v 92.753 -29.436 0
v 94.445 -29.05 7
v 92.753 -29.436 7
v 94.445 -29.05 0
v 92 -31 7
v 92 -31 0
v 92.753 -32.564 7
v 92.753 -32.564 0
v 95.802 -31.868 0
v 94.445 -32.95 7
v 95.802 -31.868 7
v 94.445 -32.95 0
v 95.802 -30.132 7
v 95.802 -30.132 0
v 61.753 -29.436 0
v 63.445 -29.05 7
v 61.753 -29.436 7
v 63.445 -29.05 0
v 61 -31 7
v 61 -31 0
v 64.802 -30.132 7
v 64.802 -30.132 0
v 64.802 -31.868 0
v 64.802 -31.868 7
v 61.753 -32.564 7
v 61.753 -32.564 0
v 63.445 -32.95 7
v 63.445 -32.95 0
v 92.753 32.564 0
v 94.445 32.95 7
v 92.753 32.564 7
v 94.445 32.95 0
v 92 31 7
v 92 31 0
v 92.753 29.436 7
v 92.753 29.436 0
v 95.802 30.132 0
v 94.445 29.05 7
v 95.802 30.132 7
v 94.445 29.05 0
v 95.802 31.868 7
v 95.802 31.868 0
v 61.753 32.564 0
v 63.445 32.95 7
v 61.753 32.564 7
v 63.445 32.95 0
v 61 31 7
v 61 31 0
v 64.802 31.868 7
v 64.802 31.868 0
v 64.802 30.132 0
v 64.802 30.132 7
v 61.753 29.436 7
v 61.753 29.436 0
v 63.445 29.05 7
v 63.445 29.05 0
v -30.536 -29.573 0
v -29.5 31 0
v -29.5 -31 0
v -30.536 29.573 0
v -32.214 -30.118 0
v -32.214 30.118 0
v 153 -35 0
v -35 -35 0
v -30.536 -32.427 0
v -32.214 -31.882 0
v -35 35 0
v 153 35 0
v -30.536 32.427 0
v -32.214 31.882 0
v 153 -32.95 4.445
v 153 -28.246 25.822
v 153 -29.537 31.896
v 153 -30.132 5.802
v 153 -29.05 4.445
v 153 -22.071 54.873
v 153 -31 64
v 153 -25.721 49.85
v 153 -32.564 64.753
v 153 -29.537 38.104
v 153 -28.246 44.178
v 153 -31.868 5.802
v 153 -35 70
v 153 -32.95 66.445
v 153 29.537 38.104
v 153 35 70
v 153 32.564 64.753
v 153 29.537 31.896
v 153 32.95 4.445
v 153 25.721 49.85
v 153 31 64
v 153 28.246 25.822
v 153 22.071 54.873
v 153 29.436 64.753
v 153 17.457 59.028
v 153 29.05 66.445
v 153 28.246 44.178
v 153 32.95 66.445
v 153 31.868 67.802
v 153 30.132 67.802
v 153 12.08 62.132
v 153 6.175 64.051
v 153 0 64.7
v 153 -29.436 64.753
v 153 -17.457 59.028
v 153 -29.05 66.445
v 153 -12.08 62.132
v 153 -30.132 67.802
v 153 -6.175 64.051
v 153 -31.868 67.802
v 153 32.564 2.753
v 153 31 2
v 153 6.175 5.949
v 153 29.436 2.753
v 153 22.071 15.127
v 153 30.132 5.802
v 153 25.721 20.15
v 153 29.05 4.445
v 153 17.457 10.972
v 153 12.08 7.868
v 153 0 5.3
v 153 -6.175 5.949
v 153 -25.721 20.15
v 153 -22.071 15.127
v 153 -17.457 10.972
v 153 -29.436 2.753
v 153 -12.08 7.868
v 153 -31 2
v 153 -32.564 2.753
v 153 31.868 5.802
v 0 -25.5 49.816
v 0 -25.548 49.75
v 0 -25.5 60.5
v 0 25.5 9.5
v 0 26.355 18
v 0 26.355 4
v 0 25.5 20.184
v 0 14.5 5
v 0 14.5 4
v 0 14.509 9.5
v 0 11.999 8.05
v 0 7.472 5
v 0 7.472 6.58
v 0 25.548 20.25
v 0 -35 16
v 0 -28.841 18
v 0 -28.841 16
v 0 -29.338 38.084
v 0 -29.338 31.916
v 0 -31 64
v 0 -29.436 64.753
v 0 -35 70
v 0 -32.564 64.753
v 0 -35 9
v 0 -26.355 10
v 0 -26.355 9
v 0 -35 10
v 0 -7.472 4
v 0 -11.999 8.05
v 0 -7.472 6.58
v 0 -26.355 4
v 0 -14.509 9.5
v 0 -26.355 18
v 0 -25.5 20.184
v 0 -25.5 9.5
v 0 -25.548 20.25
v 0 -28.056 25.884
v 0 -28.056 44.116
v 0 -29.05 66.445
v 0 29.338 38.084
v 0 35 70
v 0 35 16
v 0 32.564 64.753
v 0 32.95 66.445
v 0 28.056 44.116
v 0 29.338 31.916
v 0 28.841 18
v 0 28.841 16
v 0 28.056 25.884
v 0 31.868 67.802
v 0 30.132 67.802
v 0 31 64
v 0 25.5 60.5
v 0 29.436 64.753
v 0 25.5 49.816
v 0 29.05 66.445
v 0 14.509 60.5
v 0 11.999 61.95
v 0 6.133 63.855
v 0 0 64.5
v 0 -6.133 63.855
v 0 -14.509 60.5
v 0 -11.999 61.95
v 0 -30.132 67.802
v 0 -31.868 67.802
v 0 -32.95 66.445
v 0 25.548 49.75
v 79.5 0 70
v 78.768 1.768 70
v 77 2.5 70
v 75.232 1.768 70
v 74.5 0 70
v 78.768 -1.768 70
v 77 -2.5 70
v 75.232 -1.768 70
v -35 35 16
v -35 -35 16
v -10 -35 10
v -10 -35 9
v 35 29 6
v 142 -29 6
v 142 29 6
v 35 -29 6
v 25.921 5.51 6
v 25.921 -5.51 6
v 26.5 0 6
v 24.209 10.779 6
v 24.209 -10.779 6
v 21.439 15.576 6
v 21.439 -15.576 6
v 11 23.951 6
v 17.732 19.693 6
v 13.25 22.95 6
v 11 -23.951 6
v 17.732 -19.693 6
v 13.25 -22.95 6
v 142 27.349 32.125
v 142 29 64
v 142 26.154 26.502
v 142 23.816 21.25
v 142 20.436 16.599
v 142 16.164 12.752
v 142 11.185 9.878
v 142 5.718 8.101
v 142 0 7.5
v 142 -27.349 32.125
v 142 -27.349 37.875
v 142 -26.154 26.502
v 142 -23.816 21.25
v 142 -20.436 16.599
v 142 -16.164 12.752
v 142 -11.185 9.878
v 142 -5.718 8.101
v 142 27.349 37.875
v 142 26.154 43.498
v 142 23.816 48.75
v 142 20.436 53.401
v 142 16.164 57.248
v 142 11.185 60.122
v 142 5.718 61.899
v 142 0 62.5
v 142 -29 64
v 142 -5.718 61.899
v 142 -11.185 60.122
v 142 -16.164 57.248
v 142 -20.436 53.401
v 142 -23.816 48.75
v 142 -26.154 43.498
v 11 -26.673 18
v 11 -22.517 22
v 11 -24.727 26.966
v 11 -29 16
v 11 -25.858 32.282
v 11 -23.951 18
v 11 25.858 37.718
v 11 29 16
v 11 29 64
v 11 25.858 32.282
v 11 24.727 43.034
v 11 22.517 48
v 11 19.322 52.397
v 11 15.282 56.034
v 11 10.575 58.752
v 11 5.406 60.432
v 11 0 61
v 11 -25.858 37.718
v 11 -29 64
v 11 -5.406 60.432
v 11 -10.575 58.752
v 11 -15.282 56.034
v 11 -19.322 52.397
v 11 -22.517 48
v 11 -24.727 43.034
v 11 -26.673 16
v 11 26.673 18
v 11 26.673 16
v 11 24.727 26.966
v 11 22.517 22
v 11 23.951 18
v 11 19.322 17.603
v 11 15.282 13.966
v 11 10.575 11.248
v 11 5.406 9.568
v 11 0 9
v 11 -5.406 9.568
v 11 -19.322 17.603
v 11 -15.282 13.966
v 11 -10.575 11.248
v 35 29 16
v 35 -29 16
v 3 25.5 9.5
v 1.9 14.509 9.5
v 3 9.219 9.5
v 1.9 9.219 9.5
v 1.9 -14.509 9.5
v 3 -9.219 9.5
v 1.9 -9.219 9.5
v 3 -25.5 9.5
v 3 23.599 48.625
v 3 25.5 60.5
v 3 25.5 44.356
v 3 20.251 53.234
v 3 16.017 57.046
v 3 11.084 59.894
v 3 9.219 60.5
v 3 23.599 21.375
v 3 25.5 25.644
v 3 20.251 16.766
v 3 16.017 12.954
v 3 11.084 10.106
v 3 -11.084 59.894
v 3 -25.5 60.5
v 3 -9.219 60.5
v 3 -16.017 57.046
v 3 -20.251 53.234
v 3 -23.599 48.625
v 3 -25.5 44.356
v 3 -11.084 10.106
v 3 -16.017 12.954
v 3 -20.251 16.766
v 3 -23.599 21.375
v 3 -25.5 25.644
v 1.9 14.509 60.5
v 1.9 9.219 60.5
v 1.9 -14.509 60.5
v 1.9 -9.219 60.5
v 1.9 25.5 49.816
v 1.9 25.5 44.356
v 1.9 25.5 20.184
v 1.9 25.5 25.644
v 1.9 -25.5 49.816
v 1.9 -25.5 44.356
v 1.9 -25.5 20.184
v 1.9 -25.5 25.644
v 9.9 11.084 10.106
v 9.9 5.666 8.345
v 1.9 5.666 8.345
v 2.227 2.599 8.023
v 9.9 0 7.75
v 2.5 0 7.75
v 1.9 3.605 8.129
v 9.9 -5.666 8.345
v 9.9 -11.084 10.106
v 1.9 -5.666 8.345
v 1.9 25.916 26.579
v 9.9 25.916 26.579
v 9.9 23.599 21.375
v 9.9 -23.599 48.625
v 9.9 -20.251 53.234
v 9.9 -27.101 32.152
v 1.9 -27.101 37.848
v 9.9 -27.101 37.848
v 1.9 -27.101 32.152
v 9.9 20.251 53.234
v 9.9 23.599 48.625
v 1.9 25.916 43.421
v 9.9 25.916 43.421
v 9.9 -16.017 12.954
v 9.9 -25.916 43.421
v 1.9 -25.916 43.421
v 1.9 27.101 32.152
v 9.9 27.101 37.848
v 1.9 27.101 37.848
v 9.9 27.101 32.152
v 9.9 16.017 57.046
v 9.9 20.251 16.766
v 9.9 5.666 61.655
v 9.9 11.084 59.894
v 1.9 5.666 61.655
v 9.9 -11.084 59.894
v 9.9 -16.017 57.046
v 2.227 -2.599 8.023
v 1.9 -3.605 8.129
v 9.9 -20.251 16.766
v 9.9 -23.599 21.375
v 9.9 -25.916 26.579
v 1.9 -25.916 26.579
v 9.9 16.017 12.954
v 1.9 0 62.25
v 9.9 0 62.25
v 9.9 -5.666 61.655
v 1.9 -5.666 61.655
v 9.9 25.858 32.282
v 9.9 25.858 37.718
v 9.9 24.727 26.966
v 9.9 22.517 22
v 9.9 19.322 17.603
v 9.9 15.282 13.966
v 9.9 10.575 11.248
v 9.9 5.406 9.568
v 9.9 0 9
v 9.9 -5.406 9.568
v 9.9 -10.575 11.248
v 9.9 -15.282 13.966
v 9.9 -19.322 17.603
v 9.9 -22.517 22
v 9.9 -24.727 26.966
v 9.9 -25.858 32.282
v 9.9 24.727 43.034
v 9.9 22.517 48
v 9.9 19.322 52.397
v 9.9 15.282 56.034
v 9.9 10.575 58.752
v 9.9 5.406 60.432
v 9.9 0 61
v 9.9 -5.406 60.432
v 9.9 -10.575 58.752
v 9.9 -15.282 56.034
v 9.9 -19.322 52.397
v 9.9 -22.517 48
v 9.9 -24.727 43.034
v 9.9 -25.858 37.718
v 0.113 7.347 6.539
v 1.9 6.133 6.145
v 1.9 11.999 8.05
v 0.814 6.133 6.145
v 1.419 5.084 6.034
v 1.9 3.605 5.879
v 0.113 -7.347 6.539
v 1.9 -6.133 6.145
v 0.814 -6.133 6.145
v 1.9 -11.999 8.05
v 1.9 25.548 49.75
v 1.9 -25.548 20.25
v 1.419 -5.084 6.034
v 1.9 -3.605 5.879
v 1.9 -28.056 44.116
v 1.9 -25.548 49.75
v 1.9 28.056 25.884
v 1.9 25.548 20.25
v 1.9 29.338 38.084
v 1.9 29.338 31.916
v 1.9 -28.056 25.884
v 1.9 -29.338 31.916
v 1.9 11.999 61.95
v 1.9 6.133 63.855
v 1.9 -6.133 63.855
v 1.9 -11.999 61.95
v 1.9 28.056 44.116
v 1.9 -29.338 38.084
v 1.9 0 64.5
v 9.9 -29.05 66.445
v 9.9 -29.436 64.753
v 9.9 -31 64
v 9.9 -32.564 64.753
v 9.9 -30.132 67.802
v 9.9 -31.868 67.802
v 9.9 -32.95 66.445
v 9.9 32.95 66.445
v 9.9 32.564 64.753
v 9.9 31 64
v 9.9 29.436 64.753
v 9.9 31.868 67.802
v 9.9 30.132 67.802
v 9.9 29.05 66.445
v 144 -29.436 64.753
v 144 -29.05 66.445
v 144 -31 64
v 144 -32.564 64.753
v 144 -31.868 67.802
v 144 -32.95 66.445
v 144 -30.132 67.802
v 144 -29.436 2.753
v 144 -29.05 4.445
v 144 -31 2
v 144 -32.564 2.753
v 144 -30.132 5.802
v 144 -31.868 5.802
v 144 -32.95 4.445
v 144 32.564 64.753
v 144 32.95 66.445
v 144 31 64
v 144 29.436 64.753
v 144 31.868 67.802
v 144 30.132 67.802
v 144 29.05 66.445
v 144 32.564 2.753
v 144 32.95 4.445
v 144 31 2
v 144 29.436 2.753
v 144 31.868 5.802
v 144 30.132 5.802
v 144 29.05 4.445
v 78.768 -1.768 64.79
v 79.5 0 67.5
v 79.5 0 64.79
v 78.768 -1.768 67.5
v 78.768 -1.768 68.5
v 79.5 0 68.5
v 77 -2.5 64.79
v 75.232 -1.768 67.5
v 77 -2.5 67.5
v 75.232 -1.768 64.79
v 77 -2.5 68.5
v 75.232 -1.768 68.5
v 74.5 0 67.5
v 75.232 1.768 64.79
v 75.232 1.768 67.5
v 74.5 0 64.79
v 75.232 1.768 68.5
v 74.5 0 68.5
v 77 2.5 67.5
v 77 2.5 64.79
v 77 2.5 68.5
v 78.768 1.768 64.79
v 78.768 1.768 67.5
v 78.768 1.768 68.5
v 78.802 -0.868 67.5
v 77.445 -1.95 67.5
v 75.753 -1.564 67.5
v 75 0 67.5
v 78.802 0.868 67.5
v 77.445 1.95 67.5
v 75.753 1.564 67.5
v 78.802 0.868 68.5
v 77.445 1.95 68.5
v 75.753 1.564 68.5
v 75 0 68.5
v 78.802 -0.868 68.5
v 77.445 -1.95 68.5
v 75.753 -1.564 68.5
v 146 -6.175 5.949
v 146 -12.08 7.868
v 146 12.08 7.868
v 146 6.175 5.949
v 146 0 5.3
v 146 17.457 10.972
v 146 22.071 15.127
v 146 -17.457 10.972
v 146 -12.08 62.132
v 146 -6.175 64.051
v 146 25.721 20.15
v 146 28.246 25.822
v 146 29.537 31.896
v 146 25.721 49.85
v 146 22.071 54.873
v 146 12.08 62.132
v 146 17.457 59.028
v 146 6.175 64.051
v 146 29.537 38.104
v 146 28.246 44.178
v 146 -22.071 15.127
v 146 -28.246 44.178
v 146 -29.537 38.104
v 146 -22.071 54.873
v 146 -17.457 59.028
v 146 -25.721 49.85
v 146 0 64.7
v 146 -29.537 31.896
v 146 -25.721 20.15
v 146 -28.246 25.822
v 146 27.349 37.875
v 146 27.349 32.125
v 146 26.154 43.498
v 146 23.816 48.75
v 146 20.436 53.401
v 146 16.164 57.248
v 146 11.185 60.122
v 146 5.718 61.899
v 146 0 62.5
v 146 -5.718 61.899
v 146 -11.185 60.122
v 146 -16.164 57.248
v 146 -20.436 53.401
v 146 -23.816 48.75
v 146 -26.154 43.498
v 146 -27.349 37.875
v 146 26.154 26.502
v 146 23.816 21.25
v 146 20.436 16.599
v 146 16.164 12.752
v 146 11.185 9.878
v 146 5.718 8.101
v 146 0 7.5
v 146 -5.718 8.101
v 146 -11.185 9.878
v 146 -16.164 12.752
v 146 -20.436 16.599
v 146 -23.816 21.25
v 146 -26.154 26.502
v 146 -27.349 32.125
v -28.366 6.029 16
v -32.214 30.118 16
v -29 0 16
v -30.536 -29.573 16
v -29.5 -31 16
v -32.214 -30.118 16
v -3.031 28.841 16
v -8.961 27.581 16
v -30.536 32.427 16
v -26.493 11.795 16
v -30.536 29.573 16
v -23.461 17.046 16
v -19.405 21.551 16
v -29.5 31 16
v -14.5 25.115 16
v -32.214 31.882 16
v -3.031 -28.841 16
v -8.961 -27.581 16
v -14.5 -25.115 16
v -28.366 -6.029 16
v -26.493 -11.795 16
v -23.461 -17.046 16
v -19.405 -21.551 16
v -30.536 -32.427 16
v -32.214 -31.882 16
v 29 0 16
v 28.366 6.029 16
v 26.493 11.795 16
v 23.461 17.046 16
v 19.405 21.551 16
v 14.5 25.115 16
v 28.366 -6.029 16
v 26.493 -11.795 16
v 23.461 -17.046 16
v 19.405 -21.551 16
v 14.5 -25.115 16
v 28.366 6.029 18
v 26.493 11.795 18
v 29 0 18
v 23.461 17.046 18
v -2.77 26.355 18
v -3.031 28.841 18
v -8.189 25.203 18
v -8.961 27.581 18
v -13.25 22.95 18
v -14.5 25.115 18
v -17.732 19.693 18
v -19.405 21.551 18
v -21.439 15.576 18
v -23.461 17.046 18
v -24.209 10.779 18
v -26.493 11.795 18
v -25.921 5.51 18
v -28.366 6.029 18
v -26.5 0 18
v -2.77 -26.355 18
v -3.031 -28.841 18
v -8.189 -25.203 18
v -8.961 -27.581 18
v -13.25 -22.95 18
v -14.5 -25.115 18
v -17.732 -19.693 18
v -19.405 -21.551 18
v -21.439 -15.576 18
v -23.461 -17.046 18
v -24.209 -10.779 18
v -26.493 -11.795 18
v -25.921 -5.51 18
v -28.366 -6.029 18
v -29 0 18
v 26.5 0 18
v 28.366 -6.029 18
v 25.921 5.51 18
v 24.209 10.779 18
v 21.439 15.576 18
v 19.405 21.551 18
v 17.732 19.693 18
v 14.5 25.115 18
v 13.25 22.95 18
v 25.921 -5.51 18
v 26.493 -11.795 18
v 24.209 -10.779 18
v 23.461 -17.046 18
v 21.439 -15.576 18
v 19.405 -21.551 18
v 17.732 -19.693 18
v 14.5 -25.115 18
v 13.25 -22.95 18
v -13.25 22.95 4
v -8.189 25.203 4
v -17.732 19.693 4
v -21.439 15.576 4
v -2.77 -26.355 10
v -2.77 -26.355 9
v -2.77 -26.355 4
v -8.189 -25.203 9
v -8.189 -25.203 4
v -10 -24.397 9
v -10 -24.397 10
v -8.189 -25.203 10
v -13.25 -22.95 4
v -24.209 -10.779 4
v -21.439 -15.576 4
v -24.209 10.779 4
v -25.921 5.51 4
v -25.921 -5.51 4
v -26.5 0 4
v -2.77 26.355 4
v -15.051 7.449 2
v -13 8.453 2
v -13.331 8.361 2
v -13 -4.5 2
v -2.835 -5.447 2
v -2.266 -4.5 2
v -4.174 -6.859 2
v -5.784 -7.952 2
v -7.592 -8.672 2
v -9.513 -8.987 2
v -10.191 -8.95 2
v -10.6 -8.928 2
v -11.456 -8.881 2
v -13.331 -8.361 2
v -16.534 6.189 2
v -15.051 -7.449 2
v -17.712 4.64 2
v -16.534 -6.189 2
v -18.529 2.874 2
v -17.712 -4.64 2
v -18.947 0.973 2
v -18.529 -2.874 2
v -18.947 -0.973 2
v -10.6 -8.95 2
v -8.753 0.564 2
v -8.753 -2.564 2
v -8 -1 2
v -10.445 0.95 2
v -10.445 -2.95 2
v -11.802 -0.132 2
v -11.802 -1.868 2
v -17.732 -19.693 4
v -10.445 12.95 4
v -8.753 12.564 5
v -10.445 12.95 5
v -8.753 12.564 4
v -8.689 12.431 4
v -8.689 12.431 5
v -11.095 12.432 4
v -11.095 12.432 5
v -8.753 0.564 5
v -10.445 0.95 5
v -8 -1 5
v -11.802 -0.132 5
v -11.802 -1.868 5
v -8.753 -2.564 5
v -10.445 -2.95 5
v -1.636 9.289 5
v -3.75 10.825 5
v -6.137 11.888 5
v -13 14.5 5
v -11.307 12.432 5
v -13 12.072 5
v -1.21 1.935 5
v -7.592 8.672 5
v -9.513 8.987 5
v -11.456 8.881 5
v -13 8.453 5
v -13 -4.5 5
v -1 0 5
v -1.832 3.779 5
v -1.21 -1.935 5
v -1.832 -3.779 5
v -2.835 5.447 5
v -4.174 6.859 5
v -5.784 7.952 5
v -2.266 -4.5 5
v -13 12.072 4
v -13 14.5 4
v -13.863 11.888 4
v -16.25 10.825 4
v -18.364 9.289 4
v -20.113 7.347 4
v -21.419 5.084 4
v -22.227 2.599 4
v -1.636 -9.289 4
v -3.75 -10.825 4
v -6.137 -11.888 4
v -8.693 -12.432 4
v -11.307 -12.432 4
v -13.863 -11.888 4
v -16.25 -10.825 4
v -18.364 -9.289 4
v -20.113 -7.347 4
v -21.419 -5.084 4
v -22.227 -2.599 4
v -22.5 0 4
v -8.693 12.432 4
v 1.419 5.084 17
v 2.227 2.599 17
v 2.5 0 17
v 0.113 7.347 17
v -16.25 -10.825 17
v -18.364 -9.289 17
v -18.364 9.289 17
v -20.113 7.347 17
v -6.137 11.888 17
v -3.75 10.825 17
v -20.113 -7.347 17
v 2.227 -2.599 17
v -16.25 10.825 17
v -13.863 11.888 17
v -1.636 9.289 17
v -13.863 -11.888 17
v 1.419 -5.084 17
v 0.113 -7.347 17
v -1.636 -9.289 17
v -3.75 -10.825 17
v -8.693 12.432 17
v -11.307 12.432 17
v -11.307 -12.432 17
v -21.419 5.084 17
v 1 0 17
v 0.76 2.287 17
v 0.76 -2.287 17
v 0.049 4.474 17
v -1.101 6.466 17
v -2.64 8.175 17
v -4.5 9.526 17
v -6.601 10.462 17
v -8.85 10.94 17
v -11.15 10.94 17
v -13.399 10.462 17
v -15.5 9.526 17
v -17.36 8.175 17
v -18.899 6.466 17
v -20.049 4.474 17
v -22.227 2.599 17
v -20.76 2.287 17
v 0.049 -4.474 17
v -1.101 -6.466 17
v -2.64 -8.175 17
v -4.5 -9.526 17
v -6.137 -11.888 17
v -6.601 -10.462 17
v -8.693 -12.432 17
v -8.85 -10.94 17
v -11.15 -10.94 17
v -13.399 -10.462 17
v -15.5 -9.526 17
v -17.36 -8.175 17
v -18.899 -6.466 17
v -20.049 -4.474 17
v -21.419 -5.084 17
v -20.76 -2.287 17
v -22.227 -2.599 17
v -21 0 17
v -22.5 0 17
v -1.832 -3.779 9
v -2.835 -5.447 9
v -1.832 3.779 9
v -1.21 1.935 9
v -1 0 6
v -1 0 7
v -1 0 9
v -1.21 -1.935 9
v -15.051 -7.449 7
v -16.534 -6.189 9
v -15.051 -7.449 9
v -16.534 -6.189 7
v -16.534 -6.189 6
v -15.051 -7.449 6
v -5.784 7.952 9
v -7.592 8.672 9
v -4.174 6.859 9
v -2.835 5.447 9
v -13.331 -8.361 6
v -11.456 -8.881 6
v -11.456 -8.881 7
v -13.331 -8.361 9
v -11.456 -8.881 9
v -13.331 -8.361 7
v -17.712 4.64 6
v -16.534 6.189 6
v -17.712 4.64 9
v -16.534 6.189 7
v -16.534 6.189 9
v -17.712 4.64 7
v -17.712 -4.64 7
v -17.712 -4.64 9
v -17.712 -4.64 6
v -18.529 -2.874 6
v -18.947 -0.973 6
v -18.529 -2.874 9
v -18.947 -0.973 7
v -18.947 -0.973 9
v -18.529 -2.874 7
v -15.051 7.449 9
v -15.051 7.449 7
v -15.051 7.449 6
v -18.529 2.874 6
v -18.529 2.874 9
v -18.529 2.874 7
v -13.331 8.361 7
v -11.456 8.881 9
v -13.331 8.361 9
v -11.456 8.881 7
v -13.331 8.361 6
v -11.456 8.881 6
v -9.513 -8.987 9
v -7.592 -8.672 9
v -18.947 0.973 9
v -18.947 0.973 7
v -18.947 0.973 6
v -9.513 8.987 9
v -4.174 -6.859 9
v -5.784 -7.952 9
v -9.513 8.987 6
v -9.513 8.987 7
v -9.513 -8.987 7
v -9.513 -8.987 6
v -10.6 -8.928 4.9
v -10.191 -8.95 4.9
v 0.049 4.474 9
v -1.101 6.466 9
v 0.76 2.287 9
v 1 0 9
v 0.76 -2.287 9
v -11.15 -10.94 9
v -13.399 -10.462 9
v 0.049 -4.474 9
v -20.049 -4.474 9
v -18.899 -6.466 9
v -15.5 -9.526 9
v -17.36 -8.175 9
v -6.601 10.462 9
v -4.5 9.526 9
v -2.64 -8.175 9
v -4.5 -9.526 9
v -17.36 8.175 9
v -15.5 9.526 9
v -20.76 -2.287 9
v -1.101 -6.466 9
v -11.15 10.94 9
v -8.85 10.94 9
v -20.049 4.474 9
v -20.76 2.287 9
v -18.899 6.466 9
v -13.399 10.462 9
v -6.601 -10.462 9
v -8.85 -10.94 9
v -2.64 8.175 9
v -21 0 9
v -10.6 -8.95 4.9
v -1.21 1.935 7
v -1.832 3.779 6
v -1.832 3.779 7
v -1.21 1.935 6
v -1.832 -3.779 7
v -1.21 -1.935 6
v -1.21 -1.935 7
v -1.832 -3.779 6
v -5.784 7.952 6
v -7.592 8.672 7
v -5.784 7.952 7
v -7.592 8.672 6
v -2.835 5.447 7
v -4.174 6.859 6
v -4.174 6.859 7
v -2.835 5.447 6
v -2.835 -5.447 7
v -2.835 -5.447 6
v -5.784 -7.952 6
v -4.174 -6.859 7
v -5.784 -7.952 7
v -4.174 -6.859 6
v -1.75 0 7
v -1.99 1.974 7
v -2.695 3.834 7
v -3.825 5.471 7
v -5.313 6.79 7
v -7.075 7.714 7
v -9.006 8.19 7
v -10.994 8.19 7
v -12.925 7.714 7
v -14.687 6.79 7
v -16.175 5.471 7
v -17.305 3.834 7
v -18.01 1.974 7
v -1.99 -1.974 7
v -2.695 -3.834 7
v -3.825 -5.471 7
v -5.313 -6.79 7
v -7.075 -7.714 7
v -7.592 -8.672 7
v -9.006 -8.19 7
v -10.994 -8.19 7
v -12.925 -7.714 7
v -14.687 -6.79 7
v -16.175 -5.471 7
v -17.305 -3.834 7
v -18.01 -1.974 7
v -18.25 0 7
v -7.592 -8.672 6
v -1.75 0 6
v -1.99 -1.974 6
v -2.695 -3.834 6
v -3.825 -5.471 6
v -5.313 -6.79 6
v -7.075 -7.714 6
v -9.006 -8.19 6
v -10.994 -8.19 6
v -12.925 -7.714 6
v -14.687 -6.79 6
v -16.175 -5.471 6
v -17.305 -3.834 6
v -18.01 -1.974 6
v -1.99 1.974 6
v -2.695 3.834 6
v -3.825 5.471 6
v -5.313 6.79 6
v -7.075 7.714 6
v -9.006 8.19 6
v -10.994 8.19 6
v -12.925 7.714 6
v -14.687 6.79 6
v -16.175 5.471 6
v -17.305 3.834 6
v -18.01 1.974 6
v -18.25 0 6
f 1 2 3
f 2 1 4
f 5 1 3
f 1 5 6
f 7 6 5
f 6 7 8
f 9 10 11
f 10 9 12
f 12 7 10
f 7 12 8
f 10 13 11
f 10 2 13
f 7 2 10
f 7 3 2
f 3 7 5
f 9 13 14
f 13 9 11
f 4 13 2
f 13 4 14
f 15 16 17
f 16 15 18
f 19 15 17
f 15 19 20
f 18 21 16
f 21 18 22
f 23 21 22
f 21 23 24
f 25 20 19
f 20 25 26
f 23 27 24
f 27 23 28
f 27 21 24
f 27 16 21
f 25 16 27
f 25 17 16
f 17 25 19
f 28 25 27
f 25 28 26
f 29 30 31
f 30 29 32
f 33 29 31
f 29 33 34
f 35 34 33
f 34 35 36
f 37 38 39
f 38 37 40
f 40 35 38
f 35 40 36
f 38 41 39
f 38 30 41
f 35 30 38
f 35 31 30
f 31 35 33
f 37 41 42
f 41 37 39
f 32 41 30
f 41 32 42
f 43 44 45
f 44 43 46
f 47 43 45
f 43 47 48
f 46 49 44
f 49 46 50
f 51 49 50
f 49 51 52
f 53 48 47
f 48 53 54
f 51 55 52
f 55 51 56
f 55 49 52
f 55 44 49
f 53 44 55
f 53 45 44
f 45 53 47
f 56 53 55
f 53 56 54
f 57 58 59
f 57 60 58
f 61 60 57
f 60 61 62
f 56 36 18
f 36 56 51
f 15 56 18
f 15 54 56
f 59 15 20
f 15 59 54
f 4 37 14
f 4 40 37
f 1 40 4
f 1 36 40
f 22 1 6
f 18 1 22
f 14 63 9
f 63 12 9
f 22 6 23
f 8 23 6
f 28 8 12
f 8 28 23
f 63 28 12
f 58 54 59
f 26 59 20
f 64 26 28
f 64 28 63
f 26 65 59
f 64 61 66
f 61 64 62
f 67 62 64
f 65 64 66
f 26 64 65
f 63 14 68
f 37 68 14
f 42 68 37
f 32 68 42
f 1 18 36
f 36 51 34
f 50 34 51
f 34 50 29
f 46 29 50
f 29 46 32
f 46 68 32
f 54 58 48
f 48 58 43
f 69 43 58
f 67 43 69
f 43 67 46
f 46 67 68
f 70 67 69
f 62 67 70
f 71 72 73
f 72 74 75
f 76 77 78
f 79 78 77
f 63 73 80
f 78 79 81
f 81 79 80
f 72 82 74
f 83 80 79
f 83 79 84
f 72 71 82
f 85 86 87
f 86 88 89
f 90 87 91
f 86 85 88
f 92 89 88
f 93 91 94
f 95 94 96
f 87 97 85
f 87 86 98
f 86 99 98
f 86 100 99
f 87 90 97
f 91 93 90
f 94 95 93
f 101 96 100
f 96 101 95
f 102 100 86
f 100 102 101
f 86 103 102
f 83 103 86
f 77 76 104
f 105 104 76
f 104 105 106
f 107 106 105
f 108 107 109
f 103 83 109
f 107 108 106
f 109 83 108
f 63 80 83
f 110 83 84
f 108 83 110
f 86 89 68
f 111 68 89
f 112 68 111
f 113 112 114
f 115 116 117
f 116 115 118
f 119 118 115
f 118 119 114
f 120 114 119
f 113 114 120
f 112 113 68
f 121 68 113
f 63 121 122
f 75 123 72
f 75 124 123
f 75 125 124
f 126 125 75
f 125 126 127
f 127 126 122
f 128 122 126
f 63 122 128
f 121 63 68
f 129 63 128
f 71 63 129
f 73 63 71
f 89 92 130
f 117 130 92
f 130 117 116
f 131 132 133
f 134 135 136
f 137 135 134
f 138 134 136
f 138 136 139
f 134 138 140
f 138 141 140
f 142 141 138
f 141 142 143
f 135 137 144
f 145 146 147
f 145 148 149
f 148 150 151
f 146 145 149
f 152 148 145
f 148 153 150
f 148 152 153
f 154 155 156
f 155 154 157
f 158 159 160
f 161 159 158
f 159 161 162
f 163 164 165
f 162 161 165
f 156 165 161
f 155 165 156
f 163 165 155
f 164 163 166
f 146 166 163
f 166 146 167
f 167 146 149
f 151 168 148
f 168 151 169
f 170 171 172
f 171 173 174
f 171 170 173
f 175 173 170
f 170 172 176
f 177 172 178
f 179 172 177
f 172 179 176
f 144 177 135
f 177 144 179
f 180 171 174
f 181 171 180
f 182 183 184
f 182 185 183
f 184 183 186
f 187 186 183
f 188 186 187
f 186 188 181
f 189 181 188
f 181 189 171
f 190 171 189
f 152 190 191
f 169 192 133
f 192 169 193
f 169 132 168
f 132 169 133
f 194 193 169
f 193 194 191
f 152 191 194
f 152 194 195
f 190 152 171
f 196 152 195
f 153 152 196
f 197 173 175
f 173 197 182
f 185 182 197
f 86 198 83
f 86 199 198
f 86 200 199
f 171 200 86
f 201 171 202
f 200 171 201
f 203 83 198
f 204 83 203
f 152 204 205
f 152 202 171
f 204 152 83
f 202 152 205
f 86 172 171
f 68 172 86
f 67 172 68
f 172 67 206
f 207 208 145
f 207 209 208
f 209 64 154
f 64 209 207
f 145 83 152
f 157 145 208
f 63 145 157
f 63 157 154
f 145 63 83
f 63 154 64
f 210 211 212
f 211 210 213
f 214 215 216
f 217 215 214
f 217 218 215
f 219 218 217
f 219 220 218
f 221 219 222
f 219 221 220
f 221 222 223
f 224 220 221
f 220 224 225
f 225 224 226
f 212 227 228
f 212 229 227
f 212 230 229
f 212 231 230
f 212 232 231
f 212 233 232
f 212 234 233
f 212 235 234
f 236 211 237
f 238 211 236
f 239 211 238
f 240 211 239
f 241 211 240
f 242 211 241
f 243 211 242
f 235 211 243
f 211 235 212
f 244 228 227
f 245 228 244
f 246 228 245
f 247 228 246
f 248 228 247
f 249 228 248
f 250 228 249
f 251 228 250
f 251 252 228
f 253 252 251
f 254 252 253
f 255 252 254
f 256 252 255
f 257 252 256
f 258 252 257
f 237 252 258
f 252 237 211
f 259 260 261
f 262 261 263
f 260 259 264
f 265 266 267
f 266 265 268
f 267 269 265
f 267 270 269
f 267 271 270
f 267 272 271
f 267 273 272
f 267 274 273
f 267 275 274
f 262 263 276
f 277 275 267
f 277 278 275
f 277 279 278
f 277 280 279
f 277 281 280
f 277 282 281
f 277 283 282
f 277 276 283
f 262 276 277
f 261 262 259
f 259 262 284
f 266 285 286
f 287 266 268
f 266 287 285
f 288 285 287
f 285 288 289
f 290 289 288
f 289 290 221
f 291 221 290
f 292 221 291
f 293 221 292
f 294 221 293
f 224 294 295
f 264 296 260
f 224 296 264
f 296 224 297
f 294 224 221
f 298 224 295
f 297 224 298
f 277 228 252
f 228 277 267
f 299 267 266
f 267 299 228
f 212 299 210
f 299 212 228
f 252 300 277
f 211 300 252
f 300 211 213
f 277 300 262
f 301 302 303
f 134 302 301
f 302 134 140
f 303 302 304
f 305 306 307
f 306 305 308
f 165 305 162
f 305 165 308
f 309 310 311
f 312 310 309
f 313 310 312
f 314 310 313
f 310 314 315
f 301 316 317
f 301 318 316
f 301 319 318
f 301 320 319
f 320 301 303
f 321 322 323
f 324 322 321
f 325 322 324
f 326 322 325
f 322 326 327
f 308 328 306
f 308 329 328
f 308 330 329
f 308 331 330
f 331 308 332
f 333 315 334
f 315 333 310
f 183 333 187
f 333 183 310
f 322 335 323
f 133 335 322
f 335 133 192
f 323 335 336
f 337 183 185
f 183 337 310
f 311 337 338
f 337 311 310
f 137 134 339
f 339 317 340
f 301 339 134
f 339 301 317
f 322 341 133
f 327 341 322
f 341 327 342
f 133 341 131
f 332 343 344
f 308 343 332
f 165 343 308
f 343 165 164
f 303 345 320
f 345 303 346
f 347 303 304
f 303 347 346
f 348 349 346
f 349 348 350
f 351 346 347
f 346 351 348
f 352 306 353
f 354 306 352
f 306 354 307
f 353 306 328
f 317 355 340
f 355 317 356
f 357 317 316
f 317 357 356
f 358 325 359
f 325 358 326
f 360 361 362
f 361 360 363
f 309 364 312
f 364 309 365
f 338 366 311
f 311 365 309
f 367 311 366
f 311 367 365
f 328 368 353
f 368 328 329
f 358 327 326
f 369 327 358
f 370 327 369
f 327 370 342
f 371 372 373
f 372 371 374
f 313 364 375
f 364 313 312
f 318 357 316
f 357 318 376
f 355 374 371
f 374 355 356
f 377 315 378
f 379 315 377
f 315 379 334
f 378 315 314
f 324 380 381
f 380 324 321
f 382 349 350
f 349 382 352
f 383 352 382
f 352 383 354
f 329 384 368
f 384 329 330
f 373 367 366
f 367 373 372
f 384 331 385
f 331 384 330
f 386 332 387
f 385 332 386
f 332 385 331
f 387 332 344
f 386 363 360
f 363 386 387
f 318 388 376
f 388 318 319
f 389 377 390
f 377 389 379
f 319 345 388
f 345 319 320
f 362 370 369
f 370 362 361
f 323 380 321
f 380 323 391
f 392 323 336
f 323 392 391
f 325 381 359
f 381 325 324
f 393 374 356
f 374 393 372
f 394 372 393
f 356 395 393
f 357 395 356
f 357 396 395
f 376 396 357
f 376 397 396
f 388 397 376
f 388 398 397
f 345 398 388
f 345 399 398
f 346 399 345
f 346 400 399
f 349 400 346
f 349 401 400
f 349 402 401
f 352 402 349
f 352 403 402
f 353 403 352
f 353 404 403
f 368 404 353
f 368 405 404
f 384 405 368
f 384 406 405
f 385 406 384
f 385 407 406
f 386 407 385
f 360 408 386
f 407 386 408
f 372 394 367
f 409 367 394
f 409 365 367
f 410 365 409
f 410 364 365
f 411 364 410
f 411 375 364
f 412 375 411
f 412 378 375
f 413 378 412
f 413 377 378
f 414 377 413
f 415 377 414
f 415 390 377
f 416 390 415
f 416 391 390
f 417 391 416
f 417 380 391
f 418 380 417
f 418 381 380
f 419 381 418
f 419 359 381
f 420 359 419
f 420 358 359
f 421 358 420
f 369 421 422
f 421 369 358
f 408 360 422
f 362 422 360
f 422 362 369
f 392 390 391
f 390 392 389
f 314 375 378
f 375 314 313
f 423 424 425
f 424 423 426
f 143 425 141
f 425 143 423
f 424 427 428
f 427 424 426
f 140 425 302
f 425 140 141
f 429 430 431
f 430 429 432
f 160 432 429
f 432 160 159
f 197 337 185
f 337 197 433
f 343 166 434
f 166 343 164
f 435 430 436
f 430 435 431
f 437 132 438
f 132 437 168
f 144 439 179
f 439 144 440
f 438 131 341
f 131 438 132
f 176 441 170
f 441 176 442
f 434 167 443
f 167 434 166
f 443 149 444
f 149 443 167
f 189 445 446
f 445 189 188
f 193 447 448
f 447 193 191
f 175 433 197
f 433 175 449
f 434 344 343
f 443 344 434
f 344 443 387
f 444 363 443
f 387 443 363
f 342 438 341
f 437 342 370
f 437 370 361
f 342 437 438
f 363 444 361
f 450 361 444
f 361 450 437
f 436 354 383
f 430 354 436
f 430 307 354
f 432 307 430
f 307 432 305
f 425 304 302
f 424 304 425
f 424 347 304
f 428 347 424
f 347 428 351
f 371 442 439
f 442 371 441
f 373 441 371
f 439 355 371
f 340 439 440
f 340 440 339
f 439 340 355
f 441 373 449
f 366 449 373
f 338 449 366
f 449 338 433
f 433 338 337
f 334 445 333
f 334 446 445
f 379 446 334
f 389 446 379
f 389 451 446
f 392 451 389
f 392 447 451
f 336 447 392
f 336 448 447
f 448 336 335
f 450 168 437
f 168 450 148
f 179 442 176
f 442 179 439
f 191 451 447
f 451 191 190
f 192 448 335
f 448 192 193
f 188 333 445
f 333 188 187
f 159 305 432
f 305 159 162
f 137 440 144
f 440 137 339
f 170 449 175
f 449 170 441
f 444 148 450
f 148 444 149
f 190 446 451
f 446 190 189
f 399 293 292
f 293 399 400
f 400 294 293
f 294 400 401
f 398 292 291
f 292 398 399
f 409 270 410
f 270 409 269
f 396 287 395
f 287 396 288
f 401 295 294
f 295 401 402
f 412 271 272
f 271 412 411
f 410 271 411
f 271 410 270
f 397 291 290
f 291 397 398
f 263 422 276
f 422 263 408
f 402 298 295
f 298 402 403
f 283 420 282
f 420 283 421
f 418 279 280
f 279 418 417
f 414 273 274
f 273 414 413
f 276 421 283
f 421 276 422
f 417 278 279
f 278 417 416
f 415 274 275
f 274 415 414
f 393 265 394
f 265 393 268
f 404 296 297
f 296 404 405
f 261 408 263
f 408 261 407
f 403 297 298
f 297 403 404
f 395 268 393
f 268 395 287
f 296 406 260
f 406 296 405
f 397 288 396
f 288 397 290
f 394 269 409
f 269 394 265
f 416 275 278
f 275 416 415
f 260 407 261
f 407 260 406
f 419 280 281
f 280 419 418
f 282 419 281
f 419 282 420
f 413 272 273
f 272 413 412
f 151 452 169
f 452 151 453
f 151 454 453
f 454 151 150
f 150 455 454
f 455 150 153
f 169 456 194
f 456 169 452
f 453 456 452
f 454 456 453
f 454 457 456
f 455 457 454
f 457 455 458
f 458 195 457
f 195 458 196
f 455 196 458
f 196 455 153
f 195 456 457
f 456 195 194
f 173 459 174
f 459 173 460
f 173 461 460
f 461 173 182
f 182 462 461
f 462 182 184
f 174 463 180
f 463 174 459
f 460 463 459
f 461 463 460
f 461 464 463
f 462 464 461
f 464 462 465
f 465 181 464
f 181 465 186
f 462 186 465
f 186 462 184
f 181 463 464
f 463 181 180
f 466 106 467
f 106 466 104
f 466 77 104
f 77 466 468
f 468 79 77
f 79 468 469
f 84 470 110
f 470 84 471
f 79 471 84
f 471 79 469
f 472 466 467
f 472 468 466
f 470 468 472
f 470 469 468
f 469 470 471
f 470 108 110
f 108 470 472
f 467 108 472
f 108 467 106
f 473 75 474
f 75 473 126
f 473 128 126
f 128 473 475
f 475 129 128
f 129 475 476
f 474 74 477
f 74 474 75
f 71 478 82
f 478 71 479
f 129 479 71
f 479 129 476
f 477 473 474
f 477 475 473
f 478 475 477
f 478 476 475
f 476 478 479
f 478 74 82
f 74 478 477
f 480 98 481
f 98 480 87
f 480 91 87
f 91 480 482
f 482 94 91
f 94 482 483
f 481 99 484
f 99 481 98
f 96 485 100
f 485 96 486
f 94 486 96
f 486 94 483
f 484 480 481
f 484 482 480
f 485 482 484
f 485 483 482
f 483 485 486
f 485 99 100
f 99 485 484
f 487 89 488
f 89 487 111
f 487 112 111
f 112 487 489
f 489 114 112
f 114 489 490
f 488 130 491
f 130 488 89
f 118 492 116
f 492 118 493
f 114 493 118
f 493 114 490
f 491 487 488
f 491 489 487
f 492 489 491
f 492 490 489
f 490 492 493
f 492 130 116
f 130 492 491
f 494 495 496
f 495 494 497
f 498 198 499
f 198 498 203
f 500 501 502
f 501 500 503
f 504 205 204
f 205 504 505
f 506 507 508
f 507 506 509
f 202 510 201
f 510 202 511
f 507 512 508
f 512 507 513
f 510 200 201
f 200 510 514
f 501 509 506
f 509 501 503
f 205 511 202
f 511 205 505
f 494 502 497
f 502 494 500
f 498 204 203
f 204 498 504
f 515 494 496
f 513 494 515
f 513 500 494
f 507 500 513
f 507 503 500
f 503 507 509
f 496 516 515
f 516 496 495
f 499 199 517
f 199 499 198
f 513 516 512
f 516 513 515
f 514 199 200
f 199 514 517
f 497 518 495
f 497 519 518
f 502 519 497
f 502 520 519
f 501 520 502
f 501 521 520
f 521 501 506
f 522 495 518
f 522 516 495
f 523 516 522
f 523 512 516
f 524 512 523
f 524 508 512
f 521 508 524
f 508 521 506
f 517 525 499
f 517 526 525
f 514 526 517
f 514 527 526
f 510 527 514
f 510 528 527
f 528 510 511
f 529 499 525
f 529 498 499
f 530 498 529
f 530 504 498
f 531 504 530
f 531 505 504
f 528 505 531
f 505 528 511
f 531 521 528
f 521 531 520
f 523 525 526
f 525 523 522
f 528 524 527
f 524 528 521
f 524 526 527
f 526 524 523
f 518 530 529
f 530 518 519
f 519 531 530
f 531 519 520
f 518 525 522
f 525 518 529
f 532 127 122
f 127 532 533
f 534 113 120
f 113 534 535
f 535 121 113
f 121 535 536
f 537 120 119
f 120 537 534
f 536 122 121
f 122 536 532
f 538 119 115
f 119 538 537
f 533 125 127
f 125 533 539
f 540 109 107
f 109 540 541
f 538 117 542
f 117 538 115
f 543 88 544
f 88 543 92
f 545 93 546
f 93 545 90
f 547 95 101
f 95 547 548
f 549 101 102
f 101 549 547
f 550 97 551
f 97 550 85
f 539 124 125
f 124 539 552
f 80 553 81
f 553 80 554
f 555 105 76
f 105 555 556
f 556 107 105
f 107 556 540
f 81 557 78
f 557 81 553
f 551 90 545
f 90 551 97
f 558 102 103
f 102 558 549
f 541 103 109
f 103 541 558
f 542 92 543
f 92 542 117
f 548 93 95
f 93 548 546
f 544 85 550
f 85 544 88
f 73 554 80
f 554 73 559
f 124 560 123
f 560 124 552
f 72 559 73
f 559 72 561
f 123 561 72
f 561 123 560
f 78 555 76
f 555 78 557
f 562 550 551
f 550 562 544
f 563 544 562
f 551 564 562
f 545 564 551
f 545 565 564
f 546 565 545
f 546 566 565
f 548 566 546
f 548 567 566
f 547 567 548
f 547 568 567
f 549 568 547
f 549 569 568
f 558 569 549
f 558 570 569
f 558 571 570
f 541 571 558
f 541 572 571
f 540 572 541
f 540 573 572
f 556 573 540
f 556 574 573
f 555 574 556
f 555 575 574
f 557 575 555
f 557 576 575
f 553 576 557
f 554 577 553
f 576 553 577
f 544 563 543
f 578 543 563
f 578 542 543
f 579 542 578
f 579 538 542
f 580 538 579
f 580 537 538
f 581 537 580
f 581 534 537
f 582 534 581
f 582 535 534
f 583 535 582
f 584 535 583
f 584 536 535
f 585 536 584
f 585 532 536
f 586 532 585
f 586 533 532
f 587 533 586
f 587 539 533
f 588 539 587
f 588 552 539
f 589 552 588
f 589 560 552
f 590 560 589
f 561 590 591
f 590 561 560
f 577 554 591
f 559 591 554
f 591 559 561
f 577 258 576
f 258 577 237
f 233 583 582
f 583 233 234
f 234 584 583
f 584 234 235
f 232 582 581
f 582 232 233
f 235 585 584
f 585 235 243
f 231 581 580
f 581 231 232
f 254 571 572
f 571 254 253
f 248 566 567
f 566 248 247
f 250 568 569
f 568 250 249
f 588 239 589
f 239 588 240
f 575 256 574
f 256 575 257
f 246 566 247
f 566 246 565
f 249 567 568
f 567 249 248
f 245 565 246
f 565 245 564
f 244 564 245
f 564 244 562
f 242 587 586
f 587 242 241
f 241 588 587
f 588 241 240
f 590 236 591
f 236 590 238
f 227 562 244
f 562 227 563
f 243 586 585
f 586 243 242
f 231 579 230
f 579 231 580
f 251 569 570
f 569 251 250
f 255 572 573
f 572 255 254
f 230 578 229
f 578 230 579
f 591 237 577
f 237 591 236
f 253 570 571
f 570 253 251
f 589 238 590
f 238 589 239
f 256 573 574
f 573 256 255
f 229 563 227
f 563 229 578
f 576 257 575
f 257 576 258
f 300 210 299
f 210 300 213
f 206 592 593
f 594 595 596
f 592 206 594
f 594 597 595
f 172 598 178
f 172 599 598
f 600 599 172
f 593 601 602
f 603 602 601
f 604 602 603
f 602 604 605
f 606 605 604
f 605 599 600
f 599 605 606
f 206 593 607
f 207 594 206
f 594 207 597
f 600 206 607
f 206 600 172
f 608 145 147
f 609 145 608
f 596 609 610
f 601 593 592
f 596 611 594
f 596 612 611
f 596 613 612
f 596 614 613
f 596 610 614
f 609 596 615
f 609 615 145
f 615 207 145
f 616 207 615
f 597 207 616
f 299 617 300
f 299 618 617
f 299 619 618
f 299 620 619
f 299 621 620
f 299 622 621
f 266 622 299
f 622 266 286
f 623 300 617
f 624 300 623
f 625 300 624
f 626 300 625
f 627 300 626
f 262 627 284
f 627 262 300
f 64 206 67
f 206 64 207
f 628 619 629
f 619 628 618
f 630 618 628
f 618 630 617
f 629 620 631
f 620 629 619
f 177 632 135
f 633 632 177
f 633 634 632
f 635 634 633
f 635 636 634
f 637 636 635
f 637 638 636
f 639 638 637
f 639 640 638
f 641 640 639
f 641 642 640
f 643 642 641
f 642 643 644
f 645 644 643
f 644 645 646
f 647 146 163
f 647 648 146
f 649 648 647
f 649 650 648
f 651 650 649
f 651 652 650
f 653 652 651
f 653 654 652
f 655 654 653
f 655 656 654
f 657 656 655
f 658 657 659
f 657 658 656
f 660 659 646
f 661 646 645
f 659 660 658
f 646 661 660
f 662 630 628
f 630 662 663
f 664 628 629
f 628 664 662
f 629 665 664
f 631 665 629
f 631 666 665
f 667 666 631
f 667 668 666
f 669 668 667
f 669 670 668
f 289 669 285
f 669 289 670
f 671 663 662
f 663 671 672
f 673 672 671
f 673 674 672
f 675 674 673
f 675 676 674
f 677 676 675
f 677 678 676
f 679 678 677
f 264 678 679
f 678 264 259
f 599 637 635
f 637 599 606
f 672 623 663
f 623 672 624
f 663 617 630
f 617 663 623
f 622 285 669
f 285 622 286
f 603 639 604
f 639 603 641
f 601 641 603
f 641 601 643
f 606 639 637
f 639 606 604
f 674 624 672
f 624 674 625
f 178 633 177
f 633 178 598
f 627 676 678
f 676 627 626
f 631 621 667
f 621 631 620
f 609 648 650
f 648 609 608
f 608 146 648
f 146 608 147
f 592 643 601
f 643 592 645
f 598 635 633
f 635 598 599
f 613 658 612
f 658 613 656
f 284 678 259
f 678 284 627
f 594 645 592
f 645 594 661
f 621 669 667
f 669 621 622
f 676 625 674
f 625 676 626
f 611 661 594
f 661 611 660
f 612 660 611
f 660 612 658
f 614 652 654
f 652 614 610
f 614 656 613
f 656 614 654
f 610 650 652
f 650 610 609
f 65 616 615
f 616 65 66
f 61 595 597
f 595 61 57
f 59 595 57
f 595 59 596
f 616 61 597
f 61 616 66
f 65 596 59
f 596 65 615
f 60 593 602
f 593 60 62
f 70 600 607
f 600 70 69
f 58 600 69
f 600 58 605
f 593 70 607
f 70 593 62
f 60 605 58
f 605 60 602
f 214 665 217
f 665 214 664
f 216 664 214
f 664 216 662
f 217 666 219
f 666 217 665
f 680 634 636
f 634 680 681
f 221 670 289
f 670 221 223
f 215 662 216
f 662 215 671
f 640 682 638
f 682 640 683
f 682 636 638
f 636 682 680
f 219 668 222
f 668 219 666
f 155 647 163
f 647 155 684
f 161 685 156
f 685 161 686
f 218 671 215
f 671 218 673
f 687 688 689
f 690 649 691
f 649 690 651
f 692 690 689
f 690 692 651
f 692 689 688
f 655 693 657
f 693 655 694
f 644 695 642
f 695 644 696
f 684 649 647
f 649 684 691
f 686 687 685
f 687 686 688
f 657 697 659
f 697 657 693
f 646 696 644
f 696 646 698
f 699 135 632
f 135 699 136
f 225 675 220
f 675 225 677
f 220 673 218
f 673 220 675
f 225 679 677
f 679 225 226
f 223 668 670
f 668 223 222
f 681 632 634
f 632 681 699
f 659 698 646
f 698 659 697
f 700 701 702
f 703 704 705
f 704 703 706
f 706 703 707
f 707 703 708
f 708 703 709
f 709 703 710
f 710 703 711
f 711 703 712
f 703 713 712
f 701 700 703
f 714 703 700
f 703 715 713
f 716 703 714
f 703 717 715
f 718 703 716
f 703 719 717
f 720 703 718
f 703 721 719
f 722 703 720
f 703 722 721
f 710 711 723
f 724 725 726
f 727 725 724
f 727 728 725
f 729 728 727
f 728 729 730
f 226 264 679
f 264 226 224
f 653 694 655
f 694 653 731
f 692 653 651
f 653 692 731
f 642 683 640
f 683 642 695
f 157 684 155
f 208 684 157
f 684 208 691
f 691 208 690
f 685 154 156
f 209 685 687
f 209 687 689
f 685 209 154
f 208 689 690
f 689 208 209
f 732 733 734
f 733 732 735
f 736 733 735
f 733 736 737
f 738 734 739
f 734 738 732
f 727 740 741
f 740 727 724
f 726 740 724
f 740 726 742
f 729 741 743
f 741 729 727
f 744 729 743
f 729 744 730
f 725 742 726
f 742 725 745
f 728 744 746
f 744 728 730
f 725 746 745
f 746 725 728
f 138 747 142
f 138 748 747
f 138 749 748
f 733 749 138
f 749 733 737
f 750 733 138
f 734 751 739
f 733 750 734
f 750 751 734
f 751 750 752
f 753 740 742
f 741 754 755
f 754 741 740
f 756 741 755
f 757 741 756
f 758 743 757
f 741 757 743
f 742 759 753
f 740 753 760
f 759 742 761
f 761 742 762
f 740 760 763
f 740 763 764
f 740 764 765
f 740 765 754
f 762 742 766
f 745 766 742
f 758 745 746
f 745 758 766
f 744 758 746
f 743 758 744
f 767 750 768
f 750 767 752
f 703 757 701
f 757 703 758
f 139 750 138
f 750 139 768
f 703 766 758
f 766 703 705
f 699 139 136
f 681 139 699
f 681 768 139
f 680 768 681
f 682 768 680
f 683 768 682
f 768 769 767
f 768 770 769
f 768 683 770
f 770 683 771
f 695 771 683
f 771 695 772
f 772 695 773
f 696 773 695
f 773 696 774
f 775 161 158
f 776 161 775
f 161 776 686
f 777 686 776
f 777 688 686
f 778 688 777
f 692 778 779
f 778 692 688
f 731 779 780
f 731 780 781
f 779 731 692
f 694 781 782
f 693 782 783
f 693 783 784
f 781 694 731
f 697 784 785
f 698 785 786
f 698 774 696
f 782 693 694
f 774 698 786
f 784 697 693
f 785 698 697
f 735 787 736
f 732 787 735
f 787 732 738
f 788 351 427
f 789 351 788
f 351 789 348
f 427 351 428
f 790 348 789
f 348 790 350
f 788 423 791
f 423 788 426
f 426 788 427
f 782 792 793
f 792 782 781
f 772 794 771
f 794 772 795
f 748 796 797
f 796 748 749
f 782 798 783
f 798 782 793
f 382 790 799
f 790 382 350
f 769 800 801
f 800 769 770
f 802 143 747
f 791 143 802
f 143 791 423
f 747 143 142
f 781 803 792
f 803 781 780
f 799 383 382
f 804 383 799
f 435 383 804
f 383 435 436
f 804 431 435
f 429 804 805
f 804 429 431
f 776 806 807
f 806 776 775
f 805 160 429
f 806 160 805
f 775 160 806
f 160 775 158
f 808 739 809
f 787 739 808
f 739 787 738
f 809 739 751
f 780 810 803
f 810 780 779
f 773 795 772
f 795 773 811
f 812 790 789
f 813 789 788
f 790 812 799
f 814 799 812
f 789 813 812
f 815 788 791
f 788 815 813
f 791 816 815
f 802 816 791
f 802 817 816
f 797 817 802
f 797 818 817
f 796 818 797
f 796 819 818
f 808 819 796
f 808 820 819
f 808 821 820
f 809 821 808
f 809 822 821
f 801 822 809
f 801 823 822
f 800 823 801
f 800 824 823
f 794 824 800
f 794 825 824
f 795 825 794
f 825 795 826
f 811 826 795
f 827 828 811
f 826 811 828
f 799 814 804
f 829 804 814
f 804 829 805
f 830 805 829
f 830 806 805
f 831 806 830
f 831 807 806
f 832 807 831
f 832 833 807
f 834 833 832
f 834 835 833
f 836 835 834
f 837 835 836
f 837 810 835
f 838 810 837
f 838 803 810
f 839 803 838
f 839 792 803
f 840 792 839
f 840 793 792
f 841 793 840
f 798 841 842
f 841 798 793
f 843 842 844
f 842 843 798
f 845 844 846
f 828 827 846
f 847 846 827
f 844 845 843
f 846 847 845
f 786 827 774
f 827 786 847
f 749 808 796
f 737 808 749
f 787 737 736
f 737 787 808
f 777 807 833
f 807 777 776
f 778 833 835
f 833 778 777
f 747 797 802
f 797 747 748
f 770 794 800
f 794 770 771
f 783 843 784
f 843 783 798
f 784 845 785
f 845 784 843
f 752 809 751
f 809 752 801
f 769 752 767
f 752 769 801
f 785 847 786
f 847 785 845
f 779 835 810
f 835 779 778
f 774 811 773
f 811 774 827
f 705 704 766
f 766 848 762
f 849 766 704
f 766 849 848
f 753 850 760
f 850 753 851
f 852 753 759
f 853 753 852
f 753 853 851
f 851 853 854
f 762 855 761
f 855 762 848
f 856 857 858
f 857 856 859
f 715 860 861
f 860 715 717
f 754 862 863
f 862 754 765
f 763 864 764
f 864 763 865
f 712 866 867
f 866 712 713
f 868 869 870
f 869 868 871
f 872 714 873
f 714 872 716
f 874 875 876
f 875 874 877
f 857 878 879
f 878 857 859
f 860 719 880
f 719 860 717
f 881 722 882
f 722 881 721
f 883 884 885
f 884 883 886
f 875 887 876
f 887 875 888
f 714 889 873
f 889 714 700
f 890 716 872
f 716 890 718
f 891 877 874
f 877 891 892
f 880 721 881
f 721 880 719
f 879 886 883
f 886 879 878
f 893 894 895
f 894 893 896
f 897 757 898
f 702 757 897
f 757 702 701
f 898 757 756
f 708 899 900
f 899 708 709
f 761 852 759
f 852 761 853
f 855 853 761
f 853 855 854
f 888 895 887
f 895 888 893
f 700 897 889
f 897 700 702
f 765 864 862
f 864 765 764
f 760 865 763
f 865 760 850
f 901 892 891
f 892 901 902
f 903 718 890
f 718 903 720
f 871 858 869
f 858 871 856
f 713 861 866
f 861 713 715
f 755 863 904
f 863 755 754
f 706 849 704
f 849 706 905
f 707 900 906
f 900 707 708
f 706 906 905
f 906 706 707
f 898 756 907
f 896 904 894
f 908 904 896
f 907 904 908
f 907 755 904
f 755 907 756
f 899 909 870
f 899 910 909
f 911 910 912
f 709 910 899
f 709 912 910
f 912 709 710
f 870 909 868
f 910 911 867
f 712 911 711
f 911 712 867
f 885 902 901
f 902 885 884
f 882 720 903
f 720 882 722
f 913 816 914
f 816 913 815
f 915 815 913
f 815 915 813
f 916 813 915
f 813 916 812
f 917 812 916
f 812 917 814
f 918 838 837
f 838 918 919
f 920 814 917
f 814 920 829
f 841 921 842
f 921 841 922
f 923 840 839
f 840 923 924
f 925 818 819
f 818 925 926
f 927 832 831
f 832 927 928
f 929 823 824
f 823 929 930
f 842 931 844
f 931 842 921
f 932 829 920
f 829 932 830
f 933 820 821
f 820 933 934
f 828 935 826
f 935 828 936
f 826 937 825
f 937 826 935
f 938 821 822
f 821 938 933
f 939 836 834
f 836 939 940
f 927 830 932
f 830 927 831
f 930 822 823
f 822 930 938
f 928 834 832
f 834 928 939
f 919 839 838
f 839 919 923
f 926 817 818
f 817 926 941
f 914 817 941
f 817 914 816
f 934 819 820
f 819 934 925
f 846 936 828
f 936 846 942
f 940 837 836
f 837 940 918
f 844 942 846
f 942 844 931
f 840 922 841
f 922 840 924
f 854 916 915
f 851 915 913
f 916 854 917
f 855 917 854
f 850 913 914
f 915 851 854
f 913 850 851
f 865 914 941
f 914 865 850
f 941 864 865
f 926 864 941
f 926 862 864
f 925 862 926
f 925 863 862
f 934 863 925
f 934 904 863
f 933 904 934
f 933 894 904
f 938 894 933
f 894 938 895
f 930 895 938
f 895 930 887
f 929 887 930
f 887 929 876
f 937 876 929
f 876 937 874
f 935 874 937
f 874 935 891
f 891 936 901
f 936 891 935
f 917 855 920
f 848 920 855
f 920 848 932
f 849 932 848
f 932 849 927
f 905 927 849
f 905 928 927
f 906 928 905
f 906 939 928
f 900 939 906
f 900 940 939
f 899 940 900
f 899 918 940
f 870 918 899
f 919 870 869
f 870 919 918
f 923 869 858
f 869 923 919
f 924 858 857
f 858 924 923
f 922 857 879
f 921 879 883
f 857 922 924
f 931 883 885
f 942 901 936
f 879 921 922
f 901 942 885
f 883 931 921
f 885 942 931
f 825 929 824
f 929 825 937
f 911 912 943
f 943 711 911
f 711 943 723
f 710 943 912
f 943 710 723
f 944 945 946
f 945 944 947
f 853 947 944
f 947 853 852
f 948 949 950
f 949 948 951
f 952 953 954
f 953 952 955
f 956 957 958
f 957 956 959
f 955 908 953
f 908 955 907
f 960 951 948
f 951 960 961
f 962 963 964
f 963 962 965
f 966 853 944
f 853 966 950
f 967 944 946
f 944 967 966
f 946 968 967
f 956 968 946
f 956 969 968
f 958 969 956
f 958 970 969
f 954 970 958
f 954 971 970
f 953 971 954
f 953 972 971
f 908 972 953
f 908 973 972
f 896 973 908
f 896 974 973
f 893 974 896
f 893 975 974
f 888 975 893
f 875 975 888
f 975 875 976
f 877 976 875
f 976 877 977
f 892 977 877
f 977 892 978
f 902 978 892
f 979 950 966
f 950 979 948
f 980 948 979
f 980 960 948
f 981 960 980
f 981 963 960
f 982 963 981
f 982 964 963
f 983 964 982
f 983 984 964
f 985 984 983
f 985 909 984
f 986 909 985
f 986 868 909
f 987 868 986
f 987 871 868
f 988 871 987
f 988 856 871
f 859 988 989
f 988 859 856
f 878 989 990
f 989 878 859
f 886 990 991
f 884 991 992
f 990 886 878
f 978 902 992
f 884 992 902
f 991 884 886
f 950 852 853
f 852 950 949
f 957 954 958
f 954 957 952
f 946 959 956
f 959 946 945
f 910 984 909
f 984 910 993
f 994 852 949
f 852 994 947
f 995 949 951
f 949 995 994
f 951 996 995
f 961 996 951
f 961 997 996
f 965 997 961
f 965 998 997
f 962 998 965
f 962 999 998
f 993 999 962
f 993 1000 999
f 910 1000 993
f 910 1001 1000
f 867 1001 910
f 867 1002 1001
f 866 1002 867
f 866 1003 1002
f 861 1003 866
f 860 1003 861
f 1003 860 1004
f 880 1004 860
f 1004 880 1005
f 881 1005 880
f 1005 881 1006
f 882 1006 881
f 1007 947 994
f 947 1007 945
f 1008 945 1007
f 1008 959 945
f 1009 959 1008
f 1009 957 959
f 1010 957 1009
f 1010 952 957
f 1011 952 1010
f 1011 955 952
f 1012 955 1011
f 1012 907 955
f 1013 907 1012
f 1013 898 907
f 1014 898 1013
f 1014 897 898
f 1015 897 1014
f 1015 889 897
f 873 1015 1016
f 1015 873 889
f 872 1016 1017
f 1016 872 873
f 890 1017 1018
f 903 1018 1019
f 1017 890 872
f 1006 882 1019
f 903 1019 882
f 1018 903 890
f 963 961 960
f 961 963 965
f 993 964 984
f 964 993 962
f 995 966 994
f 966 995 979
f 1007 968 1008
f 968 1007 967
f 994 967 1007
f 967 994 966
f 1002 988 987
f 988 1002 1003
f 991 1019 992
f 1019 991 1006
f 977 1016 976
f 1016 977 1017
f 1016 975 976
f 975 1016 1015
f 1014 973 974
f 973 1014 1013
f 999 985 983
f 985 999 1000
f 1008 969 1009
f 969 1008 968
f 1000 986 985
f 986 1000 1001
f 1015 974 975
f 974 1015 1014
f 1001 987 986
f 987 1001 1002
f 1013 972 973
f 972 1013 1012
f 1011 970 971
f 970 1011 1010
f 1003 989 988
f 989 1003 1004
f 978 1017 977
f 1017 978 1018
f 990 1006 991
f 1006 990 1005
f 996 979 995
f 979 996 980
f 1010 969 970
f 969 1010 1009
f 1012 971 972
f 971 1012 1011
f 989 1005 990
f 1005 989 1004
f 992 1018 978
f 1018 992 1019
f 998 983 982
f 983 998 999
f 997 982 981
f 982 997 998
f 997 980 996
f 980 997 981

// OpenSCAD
// file: Camara.scad
include <Tubo.scad>



//translate([0,0,30])
//bigTubo();

Camara();




module Camara(){

//Alsa para cámara
//translate([-12.5,-10,5])
//cube([25,24,2]);

difference(){

//Crear bloque
creaBloqueCam();

//Tornillos abajo
translate([-ori+4,-ori+4,-0.1])
cylinder(r=1.5,30);
translate([ori-4,-ori+4,-0.1])
cylinder(r=1.5,30);
translate([-ori+4,ori-4,-0.1])
cylinder(r=1.5,30);
translate([ori-4,ori-4,-0.1])
cylinder(r=1.5,30);

//Tubo para camara
translate([0,0,2])
cylinder(r=(raspSellR/2)-3,18);

//Ranura cable
translate([-10,-ori-5,9])
cube([20,20,1]);

}


difference(){

translate([-13,-4.5,1])
cube([26,19,4]);

tornCam();
}





}


module tornCam(){
//Tornillos camara
translate([-10,11,-0.1])
cylinder(r=2,30);
translate([10,11,-0.1])
cylinder(r=2,30);
translate([-10,-1,-0.1])
cylinder(r=2,30);
translate([10,-1,-0.1])
cylinder(r=2,30);
}


module creaBloqueCam(){
//Bloque
translate([-bigW/2,-bigW/2,0])
cube([bigW,bigW,16]);

//Sello
cylinder(r=(raspSellR/2)-0.5,18);


}
// file: Tubo.scad
bigW = 70;
ori = bigW/2;
raspSellR = 59;
tuboH = 140;
H = tuboH+2+8+1+2;
selloH = 7;

huecoPared = 12;
huecoH = 22;

translate([0,0,bigW/2])
rotate([0,90,0])
bigTuboHueco();

module bigTuboHueco()
{
	difference()
	{
		bigTubo();	
		sello();
	}
}


module sello()
{
	translate([0,0,H-selloH])
	cylinder(r=(raspSellR/2)+0.2,selloH+0.1);
	
	translate([0,0,H-selloH-30])
	cylinder(r=(raspSellR/2)-2,selloH+40);
}


module bigTubo(){

difference(){

//Bloque
translate([-bigW/2,-bigW/2,0])
cube([bigW,bigW,H]);


translate([
						-(bigW-huecoPared)/2,
						-(bigW-huecoPared)/2,
						(huecoH/2)
					])
		cube([
					bigW-huecoPared,
					bigW-huecoPared,
					H-huecoH]
				);


//Diffractador
translate([-25.5,-25.5,-0.1])
cube([51,51,3.1]);

//Macro
translate([0,0,-0.1])
cylinder(r=(54.5/2),10);

//Sello de raspberry
translate([0,0,-0.1])
cylinder(r=(raspSellR/2),2);

//Tubo
translate([0,0,-0.1])
cylinder(r=(52/2),200);

//Tornillos abajo
translate([-ori+4,-ori+4,-0.1])
cylinder(r=2,10);
translate([ori-4,-ori+4,-0.1])
cylinder(r=2,10);
translate([-ori+4,ori-4,-0.1])
cylinder(r=2,10);
translate([ori-4,ori-4,-0.1])
cylinder(r=2,10);

//Hueco
//translate([0,0,2+8+1+2])
//cylinder(r=(raspSellR/2),tuboH+0.1);

//Tornillos arriba
translate([-ori+4,-ori+4,H-9])
cylinder(r=2,10);
translate([ori-4,-ori+4,H-9])
cylinder(r=2,10);
translate([-ori+4,ori-4,H-9])
cylinder(r=2,10);
translate([ori-4,ori-4,H-9])
cylinder(r=2,10);

//Tornillos caja
translate([0,0,(tuboH/2)-7])
rotate([0,90,0])
tornillosArriba();

//Tornillo tripie
translate([-ori-0.1,0,(tuboH/2)+7])
rotate([0,90,0])
cylinder(r=5/2,5.31);


}


//Rosca tornillo tripie
difference(){
translate([-ori+1.5,0,(tuboH/2)+7])
rotate([0,90,0])
cylinder(r=5,1);

translate([-ori+1.4,0,(tuboH/2)+7])
rotate([0,90,0])
cylinder(r=5-3,3);


}

}

module tornillosArriba(){
translate([-ori+4,-ori+4,ori-7])
cylinder(r=2,10);
translate([0,-ori+4,ori-7])
cylinder(r=2,10);
translate([-ori+4,ori-4,ori-7])
cylinder(r=2,10);
translate([0,ori-4,ori-7])
cylinder(r=2,10);
}


module tornilloTripie(){
	
}
// main file
include <Tubo.scad>
include <Camara.scad>

squareW = 6.4;
slideW = 1.2;
slideH = 17.9;

offSetX = 10;



slideAper();

//squareAper();



module roscaLenFrente(){
difference(){
cylinder(r=18/2,1);
translate([0,0,-0.1])
cylinder(r=(16.5/2),5);
}
}





module squareAper(){
difference(){
	//Área
	creaFrente();	
	//Aperture
	translate([
				-(squareW/2)-offSetX,
				-squareW/2,
				-0.1
				])
	cube([squareW,squareW,5]);
}

//Rosca lente frente
translate([0,0,6])
roscaLenFrente();

}


module slideAper(){
difference(){
	//Área
	creaFrente();	
	//Aperture
	translate([
				 -(slideW/2)-offSetX,
				 -(slideH/2),
				 -0.1
				])
	cube([slideW,slideH,5]);
}
//Rosca lente frente
translate([-offSetX,0,6])
roscaLenFrente();
}






module creaFrente(){
difference(){

//Área
creaBloqueSlide();

//Rosca
translate([-offSetX,0,2])
cylinder(r=18/2,20);

//Carcaza
translate([-offSetX,0,9])
cylinder(r=22/2,9);

//Tornillos
translate([-ori+4,-ori+4,-0.1])
cylinder(r=2,10);
translate([ori-4,-ori+4,-0.1])
cylinder(r=2,10);
translate([-ori+4,ori-4,-0.1])
cylinder(r=2,10);
translate([ori-4,ori-4,-0.1])
cylinder(r=2,10);

}
}


module creaBloqueSlide(){
//Bloque
translate([-bigW/2,-bigW/2,0])
cube([bigW,bigW,4]);

//Sello
translate([-offSetX,0,0])
cylinder(r=(26/2)-0.5,17);


}
